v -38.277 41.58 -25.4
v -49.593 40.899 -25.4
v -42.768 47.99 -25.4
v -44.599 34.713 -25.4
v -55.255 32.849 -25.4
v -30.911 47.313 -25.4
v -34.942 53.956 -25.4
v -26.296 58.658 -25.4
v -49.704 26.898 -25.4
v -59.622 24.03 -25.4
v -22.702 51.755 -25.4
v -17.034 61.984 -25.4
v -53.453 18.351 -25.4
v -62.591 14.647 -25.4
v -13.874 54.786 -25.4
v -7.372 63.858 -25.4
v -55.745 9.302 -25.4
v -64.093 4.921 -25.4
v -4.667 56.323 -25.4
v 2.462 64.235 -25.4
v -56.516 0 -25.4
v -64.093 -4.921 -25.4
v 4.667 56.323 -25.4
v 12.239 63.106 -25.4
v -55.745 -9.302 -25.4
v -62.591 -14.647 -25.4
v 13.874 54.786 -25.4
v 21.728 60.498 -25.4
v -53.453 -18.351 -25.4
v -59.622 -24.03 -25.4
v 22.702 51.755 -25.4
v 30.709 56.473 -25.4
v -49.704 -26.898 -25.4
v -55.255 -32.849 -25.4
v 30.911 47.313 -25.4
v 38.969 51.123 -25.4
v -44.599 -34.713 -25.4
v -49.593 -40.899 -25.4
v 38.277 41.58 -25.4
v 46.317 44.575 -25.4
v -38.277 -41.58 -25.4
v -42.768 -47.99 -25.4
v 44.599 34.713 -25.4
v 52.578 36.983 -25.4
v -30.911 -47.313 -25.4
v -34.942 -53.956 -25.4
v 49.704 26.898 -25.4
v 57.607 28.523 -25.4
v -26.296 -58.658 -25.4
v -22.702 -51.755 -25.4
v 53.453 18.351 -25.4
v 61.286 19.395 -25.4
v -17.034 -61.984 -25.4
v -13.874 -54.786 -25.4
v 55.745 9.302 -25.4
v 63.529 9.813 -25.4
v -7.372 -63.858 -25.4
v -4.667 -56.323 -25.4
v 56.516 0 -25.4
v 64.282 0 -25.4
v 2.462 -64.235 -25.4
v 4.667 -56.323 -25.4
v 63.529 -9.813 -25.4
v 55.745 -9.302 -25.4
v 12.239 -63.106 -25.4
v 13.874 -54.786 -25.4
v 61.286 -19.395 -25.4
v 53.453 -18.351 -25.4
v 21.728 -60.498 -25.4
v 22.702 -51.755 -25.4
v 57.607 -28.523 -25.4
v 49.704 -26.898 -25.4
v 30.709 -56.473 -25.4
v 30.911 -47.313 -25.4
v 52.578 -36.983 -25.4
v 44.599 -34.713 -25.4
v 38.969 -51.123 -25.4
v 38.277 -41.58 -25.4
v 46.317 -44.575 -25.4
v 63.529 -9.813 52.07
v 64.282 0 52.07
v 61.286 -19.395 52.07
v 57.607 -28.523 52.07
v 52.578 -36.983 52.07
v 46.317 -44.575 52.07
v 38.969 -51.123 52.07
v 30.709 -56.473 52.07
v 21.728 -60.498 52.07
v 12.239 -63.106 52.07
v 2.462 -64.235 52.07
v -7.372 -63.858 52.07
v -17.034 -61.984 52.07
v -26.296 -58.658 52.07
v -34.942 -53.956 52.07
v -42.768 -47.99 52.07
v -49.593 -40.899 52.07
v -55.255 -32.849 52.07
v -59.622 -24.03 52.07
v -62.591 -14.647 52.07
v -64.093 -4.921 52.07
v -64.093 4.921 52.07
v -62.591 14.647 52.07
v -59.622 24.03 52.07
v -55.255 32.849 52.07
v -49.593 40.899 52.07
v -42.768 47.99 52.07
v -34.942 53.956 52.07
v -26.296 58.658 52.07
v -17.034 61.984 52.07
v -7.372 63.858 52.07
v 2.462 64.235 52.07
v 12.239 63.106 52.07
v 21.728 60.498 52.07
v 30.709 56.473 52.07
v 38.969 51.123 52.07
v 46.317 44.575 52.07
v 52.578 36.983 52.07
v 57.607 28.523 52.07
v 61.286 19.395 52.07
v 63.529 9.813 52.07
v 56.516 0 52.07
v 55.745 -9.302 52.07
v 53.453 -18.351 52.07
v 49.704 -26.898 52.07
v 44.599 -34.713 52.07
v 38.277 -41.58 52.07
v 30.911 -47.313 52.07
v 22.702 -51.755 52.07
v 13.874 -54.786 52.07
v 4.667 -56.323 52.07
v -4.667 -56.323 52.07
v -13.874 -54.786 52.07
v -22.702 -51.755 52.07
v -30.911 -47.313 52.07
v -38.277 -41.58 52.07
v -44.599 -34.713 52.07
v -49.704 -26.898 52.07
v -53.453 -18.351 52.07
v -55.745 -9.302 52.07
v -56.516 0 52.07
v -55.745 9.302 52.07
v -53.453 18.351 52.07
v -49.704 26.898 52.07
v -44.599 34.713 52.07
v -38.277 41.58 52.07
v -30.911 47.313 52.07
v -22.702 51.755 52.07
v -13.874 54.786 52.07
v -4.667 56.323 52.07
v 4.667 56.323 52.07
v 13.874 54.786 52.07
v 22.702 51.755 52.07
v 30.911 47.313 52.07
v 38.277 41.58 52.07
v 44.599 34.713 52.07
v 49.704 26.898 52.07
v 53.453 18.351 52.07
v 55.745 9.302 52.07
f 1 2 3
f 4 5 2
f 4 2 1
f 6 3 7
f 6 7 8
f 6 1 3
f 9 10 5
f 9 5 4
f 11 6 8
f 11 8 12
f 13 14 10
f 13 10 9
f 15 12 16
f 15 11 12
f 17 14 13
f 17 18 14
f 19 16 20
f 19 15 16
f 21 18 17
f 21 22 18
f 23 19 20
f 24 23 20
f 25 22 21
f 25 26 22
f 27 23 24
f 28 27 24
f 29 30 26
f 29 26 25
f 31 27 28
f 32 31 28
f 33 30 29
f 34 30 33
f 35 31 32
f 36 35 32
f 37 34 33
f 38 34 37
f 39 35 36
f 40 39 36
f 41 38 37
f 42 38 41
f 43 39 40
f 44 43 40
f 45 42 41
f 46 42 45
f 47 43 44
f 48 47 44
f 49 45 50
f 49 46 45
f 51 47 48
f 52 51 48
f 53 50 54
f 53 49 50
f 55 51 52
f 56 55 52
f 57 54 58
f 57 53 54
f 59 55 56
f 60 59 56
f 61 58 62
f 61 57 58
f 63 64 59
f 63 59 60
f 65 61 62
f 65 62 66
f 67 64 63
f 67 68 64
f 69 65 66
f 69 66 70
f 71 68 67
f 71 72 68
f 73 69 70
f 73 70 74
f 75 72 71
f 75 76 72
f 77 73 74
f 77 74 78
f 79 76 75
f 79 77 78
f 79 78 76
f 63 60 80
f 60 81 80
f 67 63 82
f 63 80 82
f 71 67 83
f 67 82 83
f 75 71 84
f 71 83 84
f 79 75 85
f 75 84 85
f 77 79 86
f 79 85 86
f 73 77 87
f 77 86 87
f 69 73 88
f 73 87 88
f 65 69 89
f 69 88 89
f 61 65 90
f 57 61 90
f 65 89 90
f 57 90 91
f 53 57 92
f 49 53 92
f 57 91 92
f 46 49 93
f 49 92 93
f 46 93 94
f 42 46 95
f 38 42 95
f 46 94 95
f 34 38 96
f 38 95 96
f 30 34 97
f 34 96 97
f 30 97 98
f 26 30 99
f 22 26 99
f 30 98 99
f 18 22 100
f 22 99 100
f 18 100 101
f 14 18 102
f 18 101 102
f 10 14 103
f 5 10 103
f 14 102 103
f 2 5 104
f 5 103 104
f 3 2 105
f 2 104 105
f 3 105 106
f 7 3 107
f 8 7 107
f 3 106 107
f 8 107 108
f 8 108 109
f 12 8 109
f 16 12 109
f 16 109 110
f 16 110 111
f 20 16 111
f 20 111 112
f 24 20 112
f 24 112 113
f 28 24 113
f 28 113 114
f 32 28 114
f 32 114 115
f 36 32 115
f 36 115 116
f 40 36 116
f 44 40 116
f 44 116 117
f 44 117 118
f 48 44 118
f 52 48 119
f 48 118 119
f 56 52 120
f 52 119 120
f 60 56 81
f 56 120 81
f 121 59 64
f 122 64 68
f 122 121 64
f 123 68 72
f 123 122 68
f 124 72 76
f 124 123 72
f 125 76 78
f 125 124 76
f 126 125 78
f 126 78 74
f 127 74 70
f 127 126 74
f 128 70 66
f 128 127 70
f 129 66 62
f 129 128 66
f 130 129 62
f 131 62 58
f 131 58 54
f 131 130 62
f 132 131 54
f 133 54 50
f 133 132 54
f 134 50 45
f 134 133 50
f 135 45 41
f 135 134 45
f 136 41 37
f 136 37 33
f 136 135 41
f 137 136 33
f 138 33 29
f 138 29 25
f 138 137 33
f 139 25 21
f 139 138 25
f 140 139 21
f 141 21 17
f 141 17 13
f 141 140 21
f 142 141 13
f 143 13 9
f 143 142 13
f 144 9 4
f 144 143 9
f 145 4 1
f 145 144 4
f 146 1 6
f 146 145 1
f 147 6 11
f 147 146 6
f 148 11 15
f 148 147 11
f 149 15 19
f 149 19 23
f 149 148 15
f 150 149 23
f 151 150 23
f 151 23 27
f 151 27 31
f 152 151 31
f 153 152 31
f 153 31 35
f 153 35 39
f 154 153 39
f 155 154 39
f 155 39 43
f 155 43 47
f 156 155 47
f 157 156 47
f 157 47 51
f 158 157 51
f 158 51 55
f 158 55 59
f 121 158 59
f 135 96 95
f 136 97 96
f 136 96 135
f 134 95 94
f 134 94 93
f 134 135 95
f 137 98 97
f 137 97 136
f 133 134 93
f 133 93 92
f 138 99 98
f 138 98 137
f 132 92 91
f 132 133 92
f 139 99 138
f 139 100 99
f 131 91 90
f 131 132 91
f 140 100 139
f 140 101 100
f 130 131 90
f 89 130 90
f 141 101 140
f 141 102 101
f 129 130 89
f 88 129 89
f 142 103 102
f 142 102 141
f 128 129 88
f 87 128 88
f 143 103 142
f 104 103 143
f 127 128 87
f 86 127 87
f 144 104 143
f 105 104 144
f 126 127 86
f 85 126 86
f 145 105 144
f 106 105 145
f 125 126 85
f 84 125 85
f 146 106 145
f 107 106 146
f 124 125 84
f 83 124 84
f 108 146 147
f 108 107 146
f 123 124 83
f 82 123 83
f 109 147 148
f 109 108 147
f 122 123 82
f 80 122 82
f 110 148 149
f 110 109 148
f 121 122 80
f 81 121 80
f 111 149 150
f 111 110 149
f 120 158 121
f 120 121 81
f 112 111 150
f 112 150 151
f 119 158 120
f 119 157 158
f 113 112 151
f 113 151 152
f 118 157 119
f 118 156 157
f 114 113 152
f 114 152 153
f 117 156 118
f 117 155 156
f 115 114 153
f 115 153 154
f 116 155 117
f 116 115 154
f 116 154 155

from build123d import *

# Parameters (mm, degrees)
F0_R        = 64.282036
F0_R_2      = 56.51558
F1_DEPTH    = 52.07
F2_R        = 63.645379
F2_R_2      = 59.669369
F3_DEPTH    = 28.194
F1_FACE_R   = 64.282036
F1_FACE_R_2 = 56.51558
F4_DEPTH    = 25.4


with BuildPart() as f1:
    # F0 (on Top) → F1 (new body)
    with BuildSketch(Plane.XY):
        Circle(F0_R)
        Circle(F0_R_2, mode=Mode.SUBTRACT)
    extrude(amount=F1_DEPTH)

    # F2 (on Top) → F3 (join)
    with BuildSketch(Plane.XY):
        Circle(F2_R)
        Circle(F2_R_2, mode=Mode.SUBTRACT)
    extrude(amount=F3_DEPTH)

    # F1_face (on face) → F4 (join)
    with BuildSketch(Plane(origin=(0, 0, 0), x_dir=(1, 0, 0), z_dir=(0, 0, -1))):
        Circle(F1_FACE_R)
        Circle(F1_FACE_R_2, mode=Mode.SUBTRACT)
    extrude(amount=F4_DEPTH)


solid = f1.part
